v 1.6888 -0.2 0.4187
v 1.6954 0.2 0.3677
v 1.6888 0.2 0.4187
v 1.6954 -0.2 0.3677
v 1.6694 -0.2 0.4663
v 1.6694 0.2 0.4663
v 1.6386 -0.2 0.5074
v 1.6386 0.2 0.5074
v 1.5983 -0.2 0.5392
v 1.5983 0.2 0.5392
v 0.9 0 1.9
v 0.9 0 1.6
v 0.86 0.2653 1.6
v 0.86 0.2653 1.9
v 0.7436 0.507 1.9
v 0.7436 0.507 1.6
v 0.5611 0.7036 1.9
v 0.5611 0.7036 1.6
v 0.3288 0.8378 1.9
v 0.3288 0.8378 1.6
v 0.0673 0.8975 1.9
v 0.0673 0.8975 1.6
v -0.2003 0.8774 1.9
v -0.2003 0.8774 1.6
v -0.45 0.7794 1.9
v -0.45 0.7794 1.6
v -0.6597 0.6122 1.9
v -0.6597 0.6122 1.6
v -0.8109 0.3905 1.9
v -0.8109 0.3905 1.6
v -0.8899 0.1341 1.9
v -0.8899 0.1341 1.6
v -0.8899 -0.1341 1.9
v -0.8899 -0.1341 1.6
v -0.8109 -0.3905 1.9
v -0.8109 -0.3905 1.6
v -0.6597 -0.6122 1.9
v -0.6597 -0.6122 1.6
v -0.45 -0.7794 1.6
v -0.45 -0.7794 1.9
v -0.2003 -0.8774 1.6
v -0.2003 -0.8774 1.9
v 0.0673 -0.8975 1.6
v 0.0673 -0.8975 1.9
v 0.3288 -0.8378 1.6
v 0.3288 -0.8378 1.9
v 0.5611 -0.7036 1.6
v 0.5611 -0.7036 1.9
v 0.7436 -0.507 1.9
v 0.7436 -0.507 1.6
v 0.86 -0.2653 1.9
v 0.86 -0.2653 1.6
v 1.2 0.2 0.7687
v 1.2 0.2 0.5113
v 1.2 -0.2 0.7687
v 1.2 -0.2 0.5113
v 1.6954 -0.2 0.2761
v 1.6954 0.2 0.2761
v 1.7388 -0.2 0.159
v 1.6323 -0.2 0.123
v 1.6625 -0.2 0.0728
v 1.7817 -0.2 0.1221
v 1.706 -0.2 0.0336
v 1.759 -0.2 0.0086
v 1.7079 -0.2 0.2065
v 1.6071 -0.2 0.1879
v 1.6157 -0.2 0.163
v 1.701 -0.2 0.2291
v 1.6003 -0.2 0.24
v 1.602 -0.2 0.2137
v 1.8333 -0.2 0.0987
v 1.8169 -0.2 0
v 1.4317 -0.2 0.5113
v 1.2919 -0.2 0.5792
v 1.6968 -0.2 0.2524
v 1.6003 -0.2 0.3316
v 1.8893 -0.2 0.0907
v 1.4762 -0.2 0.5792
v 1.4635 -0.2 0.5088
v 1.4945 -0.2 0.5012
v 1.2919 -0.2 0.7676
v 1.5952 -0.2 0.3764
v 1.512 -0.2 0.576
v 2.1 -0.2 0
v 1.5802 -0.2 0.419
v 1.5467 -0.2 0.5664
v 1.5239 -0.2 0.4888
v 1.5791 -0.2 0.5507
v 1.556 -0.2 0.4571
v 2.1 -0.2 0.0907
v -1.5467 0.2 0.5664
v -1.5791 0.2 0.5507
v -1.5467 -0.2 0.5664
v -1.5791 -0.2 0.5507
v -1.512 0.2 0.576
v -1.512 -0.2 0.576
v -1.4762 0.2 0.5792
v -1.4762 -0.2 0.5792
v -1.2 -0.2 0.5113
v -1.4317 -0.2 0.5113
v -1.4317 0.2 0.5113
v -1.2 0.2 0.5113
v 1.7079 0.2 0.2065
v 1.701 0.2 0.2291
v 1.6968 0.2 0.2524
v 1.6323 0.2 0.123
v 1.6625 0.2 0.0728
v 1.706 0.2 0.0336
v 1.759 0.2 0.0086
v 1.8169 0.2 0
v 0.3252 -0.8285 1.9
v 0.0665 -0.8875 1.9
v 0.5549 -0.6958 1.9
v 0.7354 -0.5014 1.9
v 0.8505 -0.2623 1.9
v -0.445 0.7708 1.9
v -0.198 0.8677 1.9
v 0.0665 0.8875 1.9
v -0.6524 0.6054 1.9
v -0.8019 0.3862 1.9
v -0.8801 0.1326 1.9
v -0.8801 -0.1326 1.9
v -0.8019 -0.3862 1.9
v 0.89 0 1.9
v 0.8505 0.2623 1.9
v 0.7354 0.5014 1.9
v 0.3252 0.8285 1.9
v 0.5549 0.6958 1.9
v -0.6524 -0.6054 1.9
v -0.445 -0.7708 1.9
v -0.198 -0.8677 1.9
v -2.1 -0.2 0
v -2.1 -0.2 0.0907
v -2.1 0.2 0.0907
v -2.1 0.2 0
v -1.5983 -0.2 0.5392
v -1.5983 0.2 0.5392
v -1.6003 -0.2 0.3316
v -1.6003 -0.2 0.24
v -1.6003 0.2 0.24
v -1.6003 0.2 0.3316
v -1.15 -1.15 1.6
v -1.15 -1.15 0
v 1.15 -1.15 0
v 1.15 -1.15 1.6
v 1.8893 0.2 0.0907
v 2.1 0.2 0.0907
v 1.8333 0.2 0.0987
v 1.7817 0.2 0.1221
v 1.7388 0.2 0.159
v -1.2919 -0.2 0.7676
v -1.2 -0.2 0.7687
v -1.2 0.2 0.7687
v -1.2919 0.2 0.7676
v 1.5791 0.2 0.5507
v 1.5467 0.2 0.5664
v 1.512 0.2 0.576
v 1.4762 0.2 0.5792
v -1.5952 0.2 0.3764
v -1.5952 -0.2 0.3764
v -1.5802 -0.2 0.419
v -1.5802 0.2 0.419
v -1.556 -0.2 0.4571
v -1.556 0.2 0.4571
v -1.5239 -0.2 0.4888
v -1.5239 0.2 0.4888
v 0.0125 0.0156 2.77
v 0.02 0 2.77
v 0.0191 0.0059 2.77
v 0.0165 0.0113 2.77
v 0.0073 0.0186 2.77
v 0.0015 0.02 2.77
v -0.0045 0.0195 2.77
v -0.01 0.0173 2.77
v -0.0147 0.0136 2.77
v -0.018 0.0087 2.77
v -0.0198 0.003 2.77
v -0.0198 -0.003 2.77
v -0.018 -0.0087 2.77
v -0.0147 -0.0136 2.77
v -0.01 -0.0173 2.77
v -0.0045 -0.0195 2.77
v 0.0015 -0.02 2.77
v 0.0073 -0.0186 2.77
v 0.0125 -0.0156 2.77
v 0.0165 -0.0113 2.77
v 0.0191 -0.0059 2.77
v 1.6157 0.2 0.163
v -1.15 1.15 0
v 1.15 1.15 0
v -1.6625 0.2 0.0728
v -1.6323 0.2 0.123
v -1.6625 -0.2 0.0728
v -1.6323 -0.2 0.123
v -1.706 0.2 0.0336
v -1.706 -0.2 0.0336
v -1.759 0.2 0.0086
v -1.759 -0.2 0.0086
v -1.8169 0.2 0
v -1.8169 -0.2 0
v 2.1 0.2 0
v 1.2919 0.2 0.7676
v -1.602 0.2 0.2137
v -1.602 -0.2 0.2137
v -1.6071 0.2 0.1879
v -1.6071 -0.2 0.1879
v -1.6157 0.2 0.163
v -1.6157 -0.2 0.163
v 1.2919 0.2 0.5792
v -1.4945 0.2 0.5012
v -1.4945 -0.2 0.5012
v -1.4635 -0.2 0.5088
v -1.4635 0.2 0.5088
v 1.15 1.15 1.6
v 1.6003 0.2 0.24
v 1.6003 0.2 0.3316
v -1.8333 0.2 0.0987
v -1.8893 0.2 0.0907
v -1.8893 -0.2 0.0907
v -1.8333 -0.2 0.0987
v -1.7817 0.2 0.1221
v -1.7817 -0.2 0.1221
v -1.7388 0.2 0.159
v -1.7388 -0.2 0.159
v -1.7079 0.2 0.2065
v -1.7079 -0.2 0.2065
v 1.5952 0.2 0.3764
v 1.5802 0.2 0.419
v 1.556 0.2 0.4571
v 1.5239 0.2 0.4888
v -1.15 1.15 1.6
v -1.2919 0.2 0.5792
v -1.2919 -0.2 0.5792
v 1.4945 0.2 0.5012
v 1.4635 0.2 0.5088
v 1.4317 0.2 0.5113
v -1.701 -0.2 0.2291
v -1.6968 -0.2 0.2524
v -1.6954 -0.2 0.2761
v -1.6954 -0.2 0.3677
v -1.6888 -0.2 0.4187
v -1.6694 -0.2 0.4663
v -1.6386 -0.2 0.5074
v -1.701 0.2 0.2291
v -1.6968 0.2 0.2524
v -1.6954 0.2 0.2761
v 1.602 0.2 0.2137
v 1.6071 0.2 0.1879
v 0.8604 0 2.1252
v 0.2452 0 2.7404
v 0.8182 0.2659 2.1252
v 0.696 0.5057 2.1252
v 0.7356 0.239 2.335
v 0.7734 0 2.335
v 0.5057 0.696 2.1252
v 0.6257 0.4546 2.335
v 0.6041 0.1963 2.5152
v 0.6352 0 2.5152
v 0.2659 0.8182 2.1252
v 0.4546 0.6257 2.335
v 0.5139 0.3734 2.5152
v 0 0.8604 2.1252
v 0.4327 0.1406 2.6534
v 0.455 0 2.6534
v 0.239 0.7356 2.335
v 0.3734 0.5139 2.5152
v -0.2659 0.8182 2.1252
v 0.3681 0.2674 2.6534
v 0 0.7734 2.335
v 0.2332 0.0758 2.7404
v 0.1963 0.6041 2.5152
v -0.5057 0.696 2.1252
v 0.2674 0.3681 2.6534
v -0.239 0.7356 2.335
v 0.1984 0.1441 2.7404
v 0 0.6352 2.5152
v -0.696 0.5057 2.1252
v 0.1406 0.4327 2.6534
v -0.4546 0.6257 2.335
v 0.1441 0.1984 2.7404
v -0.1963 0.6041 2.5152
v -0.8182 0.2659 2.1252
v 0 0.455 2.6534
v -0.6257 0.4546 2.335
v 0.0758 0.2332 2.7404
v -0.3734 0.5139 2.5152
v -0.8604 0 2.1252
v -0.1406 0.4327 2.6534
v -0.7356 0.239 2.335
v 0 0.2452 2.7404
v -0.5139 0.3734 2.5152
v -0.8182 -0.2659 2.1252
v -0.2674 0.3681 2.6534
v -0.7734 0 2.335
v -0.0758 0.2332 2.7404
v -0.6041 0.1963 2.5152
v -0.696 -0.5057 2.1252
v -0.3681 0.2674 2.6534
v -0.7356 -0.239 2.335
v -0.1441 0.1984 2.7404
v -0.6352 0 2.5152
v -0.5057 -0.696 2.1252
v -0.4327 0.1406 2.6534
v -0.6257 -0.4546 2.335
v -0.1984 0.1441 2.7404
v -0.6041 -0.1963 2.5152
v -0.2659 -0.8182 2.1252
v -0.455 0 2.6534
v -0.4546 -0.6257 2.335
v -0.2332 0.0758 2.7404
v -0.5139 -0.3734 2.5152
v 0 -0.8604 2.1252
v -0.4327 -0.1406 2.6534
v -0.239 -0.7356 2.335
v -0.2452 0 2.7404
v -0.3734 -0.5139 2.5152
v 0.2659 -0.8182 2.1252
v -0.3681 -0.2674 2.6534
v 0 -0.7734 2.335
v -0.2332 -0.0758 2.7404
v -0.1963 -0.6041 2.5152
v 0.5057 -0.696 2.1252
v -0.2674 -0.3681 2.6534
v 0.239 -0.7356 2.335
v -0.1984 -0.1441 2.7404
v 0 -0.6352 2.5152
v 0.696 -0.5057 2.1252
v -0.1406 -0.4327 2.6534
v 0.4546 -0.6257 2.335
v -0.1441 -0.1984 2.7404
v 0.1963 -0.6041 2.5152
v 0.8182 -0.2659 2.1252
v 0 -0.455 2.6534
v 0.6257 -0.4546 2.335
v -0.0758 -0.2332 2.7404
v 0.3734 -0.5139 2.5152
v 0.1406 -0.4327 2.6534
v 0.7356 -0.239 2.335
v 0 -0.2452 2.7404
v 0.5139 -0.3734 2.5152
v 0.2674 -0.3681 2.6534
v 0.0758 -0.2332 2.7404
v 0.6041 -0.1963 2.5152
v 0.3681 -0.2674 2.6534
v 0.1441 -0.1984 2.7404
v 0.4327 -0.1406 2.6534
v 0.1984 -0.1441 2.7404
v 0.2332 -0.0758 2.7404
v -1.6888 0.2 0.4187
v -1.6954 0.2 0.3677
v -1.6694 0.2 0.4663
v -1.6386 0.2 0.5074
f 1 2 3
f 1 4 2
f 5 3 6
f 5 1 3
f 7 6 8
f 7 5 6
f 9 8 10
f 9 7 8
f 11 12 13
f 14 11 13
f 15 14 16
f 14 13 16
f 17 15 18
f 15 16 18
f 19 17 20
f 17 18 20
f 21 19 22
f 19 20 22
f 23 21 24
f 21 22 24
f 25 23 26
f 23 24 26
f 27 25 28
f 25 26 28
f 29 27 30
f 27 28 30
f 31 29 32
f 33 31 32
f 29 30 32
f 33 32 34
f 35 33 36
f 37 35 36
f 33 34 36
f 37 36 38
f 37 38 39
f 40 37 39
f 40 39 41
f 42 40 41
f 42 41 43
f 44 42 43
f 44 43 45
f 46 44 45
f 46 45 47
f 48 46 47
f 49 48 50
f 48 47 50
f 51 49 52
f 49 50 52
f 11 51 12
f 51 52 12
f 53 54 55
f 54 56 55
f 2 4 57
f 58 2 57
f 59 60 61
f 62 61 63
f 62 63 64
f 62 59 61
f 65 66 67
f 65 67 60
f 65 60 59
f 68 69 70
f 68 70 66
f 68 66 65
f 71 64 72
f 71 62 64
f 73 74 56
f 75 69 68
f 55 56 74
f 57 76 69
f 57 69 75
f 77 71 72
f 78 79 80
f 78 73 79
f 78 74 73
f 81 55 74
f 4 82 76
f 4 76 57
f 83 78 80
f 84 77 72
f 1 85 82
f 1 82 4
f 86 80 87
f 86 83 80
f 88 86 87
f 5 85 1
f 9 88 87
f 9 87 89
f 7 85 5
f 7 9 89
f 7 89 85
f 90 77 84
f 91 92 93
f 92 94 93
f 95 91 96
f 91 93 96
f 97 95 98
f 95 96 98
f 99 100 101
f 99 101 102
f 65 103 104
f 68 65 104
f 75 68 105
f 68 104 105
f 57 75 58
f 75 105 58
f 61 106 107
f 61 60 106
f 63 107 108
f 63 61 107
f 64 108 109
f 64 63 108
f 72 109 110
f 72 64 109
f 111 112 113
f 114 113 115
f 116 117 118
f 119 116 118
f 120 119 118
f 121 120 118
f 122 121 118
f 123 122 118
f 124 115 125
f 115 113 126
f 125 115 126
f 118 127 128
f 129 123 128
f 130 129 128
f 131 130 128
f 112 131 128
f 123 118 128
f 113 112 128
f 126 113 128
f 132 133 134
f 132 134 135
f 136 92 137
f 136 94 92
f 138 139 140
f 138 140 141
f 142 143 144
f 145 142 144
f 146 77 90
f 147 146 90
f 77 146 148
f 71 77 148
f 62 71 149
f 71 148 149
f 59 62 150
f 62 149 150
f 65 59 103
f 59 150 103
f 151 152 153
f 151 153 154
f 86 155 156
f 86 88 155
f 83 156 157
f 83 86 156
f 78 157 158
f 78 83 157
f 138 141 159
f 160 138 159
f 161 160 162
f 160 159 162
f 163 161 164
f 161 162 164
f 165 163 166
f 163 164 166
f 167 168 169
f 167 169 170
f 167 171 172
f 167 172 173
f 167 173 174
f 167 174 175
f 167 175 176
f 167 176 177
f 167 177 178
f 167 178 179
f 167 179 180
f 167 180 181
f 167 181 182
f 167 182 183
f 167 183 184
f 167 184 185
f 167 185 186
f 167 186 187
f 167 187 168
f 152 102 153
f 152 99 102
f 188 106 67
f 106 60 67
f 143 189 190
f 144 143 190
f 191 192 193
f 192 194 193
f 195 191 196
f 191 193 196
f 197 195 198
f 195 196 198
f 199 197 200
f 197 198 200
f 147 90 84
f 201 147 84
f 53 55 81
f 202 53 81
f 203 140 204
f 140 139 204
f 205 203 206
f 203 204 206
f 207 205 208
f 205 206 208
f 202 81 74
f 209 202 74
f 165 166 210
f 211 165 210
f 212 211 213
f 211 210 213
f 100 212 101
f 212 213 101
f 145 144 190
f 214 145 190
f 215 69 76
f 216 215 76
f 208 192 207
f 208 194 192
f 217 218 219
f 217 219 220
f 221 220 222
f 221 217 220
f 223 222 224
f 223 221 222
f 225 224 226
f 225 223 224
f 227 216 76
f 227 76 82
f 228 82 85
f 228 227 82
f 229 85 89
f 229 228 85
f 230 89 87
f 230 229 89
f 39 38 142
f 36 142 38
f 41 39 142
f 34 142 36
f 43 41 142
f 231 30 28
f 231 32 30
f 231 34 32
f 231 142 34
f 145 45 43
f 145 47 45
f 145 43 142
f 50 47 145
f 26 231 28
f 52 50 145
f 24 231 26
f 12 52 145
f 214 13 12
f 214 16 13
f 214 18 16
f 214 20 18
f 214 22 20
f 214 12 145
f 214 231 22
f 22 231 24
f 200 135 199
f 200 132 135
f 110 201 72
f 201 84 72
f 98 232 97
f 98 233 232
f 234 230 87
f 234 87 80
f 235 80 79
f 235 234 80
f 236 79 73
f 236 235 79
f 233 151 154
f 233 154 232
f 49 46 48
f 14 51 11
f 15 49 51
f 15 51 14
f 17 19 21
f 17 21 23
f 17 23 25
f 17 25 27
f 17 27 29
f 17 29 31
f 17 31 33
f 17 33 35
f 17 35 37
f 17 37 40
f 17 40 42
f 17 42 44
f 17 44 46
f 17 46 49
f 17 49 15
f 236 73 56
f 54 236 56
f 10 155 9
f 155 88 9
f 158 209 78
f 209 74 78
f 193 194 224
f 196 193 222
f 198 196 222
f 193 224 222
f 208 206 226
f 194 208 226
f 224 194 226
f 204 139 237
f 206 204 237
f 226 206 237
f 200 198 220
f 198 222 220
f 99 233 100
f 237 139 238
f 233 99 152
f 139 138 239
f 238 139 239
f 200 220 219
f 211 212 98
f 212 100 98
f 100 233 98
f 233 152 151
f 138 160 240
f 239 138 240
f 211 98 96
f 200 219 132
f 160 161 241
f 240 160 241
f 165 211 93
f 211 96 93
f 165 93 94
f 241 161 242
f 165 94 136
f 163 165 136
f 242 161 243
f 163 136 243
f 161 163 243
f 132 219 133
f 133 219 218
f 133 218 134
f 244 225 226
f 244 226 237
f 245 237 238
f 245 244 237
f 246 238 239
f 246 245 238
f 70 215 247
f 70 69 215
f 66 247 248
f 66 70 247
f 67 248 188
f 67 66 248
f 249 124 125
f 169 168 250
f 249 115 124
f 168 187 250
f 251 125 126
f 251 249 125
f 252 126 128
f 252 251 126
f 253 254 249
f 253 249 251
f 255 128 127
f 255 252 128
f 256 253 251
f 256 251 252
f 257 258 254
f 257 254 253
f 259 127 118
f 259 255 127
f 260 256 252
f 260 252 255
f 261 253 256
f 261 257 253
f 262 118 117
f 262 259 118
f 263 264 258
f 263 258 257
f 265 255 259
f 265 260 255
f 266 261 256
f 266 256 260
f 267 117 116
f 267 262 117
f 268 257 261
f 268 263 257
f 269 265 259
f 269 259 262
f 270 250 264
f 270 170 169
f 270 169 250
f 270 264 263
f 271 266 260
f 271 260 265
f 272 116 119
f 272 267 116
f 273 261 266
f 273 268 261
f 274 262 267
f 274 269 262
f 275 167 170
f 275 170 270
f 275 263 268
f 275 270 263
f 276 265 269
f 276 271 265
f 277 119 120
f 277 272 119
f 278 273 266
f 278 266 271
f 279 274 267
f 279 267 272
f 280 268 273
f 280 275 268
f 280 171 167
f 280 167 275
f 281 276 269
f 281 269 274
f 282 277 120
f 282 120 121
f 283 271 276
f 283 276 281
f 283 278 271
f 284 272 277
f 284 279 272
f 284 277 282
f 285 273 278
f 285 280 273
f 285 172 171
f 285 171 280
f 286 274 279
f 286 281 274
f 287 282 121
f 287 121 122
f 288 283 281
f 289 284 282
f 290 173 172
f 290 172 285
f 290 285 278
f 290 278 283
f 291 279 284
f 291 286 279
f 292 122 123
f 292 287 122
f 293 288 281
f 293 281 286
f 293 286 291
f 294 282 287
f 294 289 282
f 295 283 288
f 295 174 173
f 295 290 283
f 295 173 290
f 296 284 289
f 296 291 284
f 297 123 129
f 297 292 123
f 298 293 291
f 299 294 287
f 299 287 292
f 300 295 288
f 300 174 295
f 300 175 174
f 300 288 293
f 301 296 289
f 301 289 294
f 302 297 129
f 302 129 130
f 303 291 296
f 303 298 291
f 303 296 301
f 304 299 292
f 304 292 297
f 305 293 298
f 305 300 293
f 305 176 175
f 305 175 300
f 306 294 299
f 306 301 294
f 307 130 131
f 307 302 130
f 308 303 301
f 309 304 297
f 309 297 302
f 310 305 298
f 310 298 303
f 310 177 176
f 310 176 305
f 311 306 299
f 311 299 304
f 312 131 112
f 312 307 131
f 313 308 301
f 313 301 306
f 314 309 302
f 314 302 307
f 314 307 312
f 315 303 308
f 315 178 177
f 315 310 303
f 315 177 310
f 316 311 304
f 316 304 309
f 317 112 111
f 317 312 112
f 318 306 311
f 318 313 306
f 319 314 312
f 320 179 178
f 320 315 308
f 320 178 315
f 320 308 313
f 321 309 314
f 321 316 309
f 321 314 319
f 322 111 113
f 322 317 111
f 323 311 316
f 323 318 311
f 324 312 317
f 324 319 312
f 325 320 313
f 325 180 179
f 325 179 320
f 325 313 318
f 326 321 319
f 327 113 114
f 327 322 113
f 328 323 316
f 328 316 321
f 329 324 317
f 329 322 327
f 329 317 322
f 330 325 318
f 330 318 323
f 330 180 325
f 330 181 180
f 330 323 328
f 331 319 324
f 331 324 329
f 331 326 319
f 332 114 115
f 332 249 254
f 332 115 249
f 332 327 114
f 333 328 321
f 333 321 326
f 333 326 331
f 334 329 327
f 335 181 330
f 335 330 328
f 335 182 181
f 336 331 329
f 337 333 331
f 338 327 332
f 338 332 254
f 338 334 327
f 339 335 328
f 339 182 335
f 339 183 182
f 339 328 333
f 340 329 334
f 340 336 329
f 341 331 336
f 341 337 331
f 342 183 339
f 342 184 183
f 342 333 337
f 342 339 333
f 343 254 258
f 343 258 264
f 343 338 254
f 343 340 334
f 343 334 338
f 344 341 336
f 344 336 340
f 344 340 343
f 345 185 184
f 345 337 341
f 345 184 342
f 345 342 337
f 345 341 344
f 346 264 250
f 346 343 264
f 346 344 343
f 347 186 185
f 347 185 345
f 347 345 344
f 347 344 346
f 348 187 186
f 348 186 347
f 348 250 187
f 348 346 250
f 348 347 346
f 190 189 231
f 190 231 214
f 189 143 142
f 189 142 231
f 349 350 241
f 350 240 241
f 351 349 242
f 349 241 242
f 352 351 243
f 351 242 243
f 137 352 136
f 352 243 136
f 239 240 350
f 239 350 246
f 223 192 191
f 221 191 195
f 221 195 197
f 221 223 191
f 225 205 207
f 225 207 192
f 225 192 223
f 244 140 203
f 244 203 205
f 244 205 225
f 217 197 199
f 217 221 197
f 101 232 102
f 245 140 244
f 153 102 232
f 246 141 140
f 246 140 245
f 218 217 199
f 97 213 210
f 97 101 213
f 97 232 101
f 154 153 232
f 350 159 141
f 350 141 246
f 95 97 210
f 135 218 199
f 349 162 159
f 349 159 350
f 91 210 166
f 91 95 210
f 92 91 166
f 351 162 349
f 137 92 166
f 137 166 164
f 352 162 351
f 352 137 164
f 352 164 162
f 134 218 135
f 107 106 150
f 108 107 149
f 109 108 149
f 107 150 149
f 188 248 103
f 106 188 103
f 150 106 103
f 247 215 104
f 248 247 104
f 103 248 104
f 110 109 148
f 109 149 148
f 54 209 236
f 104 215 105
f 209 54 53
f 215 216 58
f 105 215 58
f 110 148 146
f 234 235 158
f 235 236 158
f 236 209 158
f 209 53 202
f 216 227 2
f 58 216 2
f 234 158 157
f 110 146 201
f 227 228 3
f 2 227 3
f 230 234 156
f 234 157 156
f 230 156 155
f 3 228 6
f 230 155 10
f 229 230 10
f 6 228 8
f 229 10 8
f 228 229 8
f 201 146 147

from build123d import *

# Parameters (mm, degrees)
F0_W         = 2.3
F0_H         = 2.3
F1_DEPTH     = 1.6
F2_R         = 0.9
F3_DEPTH     = 0.3
F4_R         = 0.89
F5_DEPTH     = 0.87
F6_R         = 0.86999
F8_DEPTH     = 0.2
F9_R         = 0.2
F10_T1_DEPTH = 0.4


# Not quite as in the source:
# - a fillet or chamfer that OpenCascade refuses, or shapes differently, is made with other operations: its cross-section is extruded or revolved along the edge and cut away or added
# - a fillet or chamfer is up to 0.001 mm smaller than in the source, because OpenCascade refuses the exact size


with BuildPart() as f1:
    # F0 (on Top) → F1 (new body)
    with BuildSketch(Plane.XY):
        Rectangle(F0_W, F0_H)
    extrude(amount=F1_DEPTH)

    # F2 (on face) → F3 (join)
    with BuildSketch(Plane.XY.offset(1.6)):
        Circle(F2_R)
    extrude(amount=F3_DEPTH)


with BuildPart() as f5:
    # F4 (on face) → F5 (new body)
    with BuildSketch(Plane.XY.offset(1.9)):
        Circle(F4_R)
    extrude(amount=F5_DEPTH)

    # F6 (radius 0.87 in the source; OpenCascade refuses exactly that, so slightly less here)
    f6_edges = [f5.edges().sort_by_distance(p)[0] for p in [
        (-0.89, 0, 2.77),
    ]]
    fillet(f6_edges, radius=F6_R)


with BuildPart() as f8:
    # F7 (on Front) → F8 (new body, symmetric)
    with BuildSketch(Plane.XZ):
        Polygon((-1.2000221869, 0.5113023705), (-1.2000221869, 0.7686837657), (-1.2919139418, 0.7676174894), (-1.2919139418, 0.5792069319), (-1.5315959482, 0.5792069319), (-1.6954116582, 0.4809875769), (-1.6954116582, 0.2360437474), (-1.756004122, 0.0907330487), (-2.1, 0.0907330487), (-2.1, 0), (-1.683620195, 0), (-1.6002507828, 0.199933569), (-1.6002507828, 0.4406041371), (-1.4906145475, 0.5113023705), align=None)
    extrude(amount=F8_DEPTH, both=True)

    # F9
    f9_edges = [f8.edges().sort_by_distance(p)[0] for p in [
        (-1.695412, 0, 0.480988),
        (-1.531596, 0, 0.579207),
        (-1.600251, 0, 0.199934),
        (-1.68362, 0, 0),
    ]]
    fillet(f9_edges, radius=F9_R)

    # F10: fillet of radius 0.2 on 4 edges, made by hand

    # F10_s2 → F10_t1 (join)
    with BuildSketch(Plane.XZ.offset(-0.2)):
        with BuildLine():
            ThreePointArc((-1.8892982143, 0.0907330487), (-1.7783807823, 0.1243079205), (-1.7047037359, 0.2137598158))
            Line((-1.7047037359, 0.2137598158), (-1.756004122, 0.0907330487))
            Line((-1.756004122, 0.0907330487), (-1.8892982143, 0.0907330487))
        make_face()
        with BuildLine():
            ThreePointArc((-1.7108171798, 0.1990987714), (-1.6993008532, 0.2368221359), (-1.6954116582, 0.2760720043))
            Line((-1.6954116582, 0.2760720043), (-1.6954116582, 0.2360437474))
            Line((-1.6954116582, 0.2360437474), (-1.7108171798, 0.1990987714))
        make_face()
        with BuildLine():
            ThreePointArc((-1.6002507828, 0.3315961203), (-1.5758604852, 0.4273104473), (-1.5086384588, 0.4996797652))
            Line((-1.5086384588, 0.4996797652), (-1.6002507828, 0.4406041371))
            Line((-1.6002507828, 0.4406041371), (-1.6002507828, 0.3315961203))
        make_face()
        with BuildLine():
            ThreePointArc((-1.540109264, 0.4793860154), (-1.4882161497, 0.5031574316), (-1.4317215879, 0.5113023705))
            Line((-1.4317215879, 0.5113023705), (-1.4906145475, 0.5113023705))
            Line((-1.4906145475, 0.5113023705), (-1.540109264, 0.4793860154))
        make_face()
    extrude(amount=F10_T1_DEPTH)


with BuildPart() as f11_1:
    # F11: instance of F8
    add(f8.part.mirror(Plane.YZ))


solid = Compound([f1.part, f5.part, f8.part, f11_1.part])
